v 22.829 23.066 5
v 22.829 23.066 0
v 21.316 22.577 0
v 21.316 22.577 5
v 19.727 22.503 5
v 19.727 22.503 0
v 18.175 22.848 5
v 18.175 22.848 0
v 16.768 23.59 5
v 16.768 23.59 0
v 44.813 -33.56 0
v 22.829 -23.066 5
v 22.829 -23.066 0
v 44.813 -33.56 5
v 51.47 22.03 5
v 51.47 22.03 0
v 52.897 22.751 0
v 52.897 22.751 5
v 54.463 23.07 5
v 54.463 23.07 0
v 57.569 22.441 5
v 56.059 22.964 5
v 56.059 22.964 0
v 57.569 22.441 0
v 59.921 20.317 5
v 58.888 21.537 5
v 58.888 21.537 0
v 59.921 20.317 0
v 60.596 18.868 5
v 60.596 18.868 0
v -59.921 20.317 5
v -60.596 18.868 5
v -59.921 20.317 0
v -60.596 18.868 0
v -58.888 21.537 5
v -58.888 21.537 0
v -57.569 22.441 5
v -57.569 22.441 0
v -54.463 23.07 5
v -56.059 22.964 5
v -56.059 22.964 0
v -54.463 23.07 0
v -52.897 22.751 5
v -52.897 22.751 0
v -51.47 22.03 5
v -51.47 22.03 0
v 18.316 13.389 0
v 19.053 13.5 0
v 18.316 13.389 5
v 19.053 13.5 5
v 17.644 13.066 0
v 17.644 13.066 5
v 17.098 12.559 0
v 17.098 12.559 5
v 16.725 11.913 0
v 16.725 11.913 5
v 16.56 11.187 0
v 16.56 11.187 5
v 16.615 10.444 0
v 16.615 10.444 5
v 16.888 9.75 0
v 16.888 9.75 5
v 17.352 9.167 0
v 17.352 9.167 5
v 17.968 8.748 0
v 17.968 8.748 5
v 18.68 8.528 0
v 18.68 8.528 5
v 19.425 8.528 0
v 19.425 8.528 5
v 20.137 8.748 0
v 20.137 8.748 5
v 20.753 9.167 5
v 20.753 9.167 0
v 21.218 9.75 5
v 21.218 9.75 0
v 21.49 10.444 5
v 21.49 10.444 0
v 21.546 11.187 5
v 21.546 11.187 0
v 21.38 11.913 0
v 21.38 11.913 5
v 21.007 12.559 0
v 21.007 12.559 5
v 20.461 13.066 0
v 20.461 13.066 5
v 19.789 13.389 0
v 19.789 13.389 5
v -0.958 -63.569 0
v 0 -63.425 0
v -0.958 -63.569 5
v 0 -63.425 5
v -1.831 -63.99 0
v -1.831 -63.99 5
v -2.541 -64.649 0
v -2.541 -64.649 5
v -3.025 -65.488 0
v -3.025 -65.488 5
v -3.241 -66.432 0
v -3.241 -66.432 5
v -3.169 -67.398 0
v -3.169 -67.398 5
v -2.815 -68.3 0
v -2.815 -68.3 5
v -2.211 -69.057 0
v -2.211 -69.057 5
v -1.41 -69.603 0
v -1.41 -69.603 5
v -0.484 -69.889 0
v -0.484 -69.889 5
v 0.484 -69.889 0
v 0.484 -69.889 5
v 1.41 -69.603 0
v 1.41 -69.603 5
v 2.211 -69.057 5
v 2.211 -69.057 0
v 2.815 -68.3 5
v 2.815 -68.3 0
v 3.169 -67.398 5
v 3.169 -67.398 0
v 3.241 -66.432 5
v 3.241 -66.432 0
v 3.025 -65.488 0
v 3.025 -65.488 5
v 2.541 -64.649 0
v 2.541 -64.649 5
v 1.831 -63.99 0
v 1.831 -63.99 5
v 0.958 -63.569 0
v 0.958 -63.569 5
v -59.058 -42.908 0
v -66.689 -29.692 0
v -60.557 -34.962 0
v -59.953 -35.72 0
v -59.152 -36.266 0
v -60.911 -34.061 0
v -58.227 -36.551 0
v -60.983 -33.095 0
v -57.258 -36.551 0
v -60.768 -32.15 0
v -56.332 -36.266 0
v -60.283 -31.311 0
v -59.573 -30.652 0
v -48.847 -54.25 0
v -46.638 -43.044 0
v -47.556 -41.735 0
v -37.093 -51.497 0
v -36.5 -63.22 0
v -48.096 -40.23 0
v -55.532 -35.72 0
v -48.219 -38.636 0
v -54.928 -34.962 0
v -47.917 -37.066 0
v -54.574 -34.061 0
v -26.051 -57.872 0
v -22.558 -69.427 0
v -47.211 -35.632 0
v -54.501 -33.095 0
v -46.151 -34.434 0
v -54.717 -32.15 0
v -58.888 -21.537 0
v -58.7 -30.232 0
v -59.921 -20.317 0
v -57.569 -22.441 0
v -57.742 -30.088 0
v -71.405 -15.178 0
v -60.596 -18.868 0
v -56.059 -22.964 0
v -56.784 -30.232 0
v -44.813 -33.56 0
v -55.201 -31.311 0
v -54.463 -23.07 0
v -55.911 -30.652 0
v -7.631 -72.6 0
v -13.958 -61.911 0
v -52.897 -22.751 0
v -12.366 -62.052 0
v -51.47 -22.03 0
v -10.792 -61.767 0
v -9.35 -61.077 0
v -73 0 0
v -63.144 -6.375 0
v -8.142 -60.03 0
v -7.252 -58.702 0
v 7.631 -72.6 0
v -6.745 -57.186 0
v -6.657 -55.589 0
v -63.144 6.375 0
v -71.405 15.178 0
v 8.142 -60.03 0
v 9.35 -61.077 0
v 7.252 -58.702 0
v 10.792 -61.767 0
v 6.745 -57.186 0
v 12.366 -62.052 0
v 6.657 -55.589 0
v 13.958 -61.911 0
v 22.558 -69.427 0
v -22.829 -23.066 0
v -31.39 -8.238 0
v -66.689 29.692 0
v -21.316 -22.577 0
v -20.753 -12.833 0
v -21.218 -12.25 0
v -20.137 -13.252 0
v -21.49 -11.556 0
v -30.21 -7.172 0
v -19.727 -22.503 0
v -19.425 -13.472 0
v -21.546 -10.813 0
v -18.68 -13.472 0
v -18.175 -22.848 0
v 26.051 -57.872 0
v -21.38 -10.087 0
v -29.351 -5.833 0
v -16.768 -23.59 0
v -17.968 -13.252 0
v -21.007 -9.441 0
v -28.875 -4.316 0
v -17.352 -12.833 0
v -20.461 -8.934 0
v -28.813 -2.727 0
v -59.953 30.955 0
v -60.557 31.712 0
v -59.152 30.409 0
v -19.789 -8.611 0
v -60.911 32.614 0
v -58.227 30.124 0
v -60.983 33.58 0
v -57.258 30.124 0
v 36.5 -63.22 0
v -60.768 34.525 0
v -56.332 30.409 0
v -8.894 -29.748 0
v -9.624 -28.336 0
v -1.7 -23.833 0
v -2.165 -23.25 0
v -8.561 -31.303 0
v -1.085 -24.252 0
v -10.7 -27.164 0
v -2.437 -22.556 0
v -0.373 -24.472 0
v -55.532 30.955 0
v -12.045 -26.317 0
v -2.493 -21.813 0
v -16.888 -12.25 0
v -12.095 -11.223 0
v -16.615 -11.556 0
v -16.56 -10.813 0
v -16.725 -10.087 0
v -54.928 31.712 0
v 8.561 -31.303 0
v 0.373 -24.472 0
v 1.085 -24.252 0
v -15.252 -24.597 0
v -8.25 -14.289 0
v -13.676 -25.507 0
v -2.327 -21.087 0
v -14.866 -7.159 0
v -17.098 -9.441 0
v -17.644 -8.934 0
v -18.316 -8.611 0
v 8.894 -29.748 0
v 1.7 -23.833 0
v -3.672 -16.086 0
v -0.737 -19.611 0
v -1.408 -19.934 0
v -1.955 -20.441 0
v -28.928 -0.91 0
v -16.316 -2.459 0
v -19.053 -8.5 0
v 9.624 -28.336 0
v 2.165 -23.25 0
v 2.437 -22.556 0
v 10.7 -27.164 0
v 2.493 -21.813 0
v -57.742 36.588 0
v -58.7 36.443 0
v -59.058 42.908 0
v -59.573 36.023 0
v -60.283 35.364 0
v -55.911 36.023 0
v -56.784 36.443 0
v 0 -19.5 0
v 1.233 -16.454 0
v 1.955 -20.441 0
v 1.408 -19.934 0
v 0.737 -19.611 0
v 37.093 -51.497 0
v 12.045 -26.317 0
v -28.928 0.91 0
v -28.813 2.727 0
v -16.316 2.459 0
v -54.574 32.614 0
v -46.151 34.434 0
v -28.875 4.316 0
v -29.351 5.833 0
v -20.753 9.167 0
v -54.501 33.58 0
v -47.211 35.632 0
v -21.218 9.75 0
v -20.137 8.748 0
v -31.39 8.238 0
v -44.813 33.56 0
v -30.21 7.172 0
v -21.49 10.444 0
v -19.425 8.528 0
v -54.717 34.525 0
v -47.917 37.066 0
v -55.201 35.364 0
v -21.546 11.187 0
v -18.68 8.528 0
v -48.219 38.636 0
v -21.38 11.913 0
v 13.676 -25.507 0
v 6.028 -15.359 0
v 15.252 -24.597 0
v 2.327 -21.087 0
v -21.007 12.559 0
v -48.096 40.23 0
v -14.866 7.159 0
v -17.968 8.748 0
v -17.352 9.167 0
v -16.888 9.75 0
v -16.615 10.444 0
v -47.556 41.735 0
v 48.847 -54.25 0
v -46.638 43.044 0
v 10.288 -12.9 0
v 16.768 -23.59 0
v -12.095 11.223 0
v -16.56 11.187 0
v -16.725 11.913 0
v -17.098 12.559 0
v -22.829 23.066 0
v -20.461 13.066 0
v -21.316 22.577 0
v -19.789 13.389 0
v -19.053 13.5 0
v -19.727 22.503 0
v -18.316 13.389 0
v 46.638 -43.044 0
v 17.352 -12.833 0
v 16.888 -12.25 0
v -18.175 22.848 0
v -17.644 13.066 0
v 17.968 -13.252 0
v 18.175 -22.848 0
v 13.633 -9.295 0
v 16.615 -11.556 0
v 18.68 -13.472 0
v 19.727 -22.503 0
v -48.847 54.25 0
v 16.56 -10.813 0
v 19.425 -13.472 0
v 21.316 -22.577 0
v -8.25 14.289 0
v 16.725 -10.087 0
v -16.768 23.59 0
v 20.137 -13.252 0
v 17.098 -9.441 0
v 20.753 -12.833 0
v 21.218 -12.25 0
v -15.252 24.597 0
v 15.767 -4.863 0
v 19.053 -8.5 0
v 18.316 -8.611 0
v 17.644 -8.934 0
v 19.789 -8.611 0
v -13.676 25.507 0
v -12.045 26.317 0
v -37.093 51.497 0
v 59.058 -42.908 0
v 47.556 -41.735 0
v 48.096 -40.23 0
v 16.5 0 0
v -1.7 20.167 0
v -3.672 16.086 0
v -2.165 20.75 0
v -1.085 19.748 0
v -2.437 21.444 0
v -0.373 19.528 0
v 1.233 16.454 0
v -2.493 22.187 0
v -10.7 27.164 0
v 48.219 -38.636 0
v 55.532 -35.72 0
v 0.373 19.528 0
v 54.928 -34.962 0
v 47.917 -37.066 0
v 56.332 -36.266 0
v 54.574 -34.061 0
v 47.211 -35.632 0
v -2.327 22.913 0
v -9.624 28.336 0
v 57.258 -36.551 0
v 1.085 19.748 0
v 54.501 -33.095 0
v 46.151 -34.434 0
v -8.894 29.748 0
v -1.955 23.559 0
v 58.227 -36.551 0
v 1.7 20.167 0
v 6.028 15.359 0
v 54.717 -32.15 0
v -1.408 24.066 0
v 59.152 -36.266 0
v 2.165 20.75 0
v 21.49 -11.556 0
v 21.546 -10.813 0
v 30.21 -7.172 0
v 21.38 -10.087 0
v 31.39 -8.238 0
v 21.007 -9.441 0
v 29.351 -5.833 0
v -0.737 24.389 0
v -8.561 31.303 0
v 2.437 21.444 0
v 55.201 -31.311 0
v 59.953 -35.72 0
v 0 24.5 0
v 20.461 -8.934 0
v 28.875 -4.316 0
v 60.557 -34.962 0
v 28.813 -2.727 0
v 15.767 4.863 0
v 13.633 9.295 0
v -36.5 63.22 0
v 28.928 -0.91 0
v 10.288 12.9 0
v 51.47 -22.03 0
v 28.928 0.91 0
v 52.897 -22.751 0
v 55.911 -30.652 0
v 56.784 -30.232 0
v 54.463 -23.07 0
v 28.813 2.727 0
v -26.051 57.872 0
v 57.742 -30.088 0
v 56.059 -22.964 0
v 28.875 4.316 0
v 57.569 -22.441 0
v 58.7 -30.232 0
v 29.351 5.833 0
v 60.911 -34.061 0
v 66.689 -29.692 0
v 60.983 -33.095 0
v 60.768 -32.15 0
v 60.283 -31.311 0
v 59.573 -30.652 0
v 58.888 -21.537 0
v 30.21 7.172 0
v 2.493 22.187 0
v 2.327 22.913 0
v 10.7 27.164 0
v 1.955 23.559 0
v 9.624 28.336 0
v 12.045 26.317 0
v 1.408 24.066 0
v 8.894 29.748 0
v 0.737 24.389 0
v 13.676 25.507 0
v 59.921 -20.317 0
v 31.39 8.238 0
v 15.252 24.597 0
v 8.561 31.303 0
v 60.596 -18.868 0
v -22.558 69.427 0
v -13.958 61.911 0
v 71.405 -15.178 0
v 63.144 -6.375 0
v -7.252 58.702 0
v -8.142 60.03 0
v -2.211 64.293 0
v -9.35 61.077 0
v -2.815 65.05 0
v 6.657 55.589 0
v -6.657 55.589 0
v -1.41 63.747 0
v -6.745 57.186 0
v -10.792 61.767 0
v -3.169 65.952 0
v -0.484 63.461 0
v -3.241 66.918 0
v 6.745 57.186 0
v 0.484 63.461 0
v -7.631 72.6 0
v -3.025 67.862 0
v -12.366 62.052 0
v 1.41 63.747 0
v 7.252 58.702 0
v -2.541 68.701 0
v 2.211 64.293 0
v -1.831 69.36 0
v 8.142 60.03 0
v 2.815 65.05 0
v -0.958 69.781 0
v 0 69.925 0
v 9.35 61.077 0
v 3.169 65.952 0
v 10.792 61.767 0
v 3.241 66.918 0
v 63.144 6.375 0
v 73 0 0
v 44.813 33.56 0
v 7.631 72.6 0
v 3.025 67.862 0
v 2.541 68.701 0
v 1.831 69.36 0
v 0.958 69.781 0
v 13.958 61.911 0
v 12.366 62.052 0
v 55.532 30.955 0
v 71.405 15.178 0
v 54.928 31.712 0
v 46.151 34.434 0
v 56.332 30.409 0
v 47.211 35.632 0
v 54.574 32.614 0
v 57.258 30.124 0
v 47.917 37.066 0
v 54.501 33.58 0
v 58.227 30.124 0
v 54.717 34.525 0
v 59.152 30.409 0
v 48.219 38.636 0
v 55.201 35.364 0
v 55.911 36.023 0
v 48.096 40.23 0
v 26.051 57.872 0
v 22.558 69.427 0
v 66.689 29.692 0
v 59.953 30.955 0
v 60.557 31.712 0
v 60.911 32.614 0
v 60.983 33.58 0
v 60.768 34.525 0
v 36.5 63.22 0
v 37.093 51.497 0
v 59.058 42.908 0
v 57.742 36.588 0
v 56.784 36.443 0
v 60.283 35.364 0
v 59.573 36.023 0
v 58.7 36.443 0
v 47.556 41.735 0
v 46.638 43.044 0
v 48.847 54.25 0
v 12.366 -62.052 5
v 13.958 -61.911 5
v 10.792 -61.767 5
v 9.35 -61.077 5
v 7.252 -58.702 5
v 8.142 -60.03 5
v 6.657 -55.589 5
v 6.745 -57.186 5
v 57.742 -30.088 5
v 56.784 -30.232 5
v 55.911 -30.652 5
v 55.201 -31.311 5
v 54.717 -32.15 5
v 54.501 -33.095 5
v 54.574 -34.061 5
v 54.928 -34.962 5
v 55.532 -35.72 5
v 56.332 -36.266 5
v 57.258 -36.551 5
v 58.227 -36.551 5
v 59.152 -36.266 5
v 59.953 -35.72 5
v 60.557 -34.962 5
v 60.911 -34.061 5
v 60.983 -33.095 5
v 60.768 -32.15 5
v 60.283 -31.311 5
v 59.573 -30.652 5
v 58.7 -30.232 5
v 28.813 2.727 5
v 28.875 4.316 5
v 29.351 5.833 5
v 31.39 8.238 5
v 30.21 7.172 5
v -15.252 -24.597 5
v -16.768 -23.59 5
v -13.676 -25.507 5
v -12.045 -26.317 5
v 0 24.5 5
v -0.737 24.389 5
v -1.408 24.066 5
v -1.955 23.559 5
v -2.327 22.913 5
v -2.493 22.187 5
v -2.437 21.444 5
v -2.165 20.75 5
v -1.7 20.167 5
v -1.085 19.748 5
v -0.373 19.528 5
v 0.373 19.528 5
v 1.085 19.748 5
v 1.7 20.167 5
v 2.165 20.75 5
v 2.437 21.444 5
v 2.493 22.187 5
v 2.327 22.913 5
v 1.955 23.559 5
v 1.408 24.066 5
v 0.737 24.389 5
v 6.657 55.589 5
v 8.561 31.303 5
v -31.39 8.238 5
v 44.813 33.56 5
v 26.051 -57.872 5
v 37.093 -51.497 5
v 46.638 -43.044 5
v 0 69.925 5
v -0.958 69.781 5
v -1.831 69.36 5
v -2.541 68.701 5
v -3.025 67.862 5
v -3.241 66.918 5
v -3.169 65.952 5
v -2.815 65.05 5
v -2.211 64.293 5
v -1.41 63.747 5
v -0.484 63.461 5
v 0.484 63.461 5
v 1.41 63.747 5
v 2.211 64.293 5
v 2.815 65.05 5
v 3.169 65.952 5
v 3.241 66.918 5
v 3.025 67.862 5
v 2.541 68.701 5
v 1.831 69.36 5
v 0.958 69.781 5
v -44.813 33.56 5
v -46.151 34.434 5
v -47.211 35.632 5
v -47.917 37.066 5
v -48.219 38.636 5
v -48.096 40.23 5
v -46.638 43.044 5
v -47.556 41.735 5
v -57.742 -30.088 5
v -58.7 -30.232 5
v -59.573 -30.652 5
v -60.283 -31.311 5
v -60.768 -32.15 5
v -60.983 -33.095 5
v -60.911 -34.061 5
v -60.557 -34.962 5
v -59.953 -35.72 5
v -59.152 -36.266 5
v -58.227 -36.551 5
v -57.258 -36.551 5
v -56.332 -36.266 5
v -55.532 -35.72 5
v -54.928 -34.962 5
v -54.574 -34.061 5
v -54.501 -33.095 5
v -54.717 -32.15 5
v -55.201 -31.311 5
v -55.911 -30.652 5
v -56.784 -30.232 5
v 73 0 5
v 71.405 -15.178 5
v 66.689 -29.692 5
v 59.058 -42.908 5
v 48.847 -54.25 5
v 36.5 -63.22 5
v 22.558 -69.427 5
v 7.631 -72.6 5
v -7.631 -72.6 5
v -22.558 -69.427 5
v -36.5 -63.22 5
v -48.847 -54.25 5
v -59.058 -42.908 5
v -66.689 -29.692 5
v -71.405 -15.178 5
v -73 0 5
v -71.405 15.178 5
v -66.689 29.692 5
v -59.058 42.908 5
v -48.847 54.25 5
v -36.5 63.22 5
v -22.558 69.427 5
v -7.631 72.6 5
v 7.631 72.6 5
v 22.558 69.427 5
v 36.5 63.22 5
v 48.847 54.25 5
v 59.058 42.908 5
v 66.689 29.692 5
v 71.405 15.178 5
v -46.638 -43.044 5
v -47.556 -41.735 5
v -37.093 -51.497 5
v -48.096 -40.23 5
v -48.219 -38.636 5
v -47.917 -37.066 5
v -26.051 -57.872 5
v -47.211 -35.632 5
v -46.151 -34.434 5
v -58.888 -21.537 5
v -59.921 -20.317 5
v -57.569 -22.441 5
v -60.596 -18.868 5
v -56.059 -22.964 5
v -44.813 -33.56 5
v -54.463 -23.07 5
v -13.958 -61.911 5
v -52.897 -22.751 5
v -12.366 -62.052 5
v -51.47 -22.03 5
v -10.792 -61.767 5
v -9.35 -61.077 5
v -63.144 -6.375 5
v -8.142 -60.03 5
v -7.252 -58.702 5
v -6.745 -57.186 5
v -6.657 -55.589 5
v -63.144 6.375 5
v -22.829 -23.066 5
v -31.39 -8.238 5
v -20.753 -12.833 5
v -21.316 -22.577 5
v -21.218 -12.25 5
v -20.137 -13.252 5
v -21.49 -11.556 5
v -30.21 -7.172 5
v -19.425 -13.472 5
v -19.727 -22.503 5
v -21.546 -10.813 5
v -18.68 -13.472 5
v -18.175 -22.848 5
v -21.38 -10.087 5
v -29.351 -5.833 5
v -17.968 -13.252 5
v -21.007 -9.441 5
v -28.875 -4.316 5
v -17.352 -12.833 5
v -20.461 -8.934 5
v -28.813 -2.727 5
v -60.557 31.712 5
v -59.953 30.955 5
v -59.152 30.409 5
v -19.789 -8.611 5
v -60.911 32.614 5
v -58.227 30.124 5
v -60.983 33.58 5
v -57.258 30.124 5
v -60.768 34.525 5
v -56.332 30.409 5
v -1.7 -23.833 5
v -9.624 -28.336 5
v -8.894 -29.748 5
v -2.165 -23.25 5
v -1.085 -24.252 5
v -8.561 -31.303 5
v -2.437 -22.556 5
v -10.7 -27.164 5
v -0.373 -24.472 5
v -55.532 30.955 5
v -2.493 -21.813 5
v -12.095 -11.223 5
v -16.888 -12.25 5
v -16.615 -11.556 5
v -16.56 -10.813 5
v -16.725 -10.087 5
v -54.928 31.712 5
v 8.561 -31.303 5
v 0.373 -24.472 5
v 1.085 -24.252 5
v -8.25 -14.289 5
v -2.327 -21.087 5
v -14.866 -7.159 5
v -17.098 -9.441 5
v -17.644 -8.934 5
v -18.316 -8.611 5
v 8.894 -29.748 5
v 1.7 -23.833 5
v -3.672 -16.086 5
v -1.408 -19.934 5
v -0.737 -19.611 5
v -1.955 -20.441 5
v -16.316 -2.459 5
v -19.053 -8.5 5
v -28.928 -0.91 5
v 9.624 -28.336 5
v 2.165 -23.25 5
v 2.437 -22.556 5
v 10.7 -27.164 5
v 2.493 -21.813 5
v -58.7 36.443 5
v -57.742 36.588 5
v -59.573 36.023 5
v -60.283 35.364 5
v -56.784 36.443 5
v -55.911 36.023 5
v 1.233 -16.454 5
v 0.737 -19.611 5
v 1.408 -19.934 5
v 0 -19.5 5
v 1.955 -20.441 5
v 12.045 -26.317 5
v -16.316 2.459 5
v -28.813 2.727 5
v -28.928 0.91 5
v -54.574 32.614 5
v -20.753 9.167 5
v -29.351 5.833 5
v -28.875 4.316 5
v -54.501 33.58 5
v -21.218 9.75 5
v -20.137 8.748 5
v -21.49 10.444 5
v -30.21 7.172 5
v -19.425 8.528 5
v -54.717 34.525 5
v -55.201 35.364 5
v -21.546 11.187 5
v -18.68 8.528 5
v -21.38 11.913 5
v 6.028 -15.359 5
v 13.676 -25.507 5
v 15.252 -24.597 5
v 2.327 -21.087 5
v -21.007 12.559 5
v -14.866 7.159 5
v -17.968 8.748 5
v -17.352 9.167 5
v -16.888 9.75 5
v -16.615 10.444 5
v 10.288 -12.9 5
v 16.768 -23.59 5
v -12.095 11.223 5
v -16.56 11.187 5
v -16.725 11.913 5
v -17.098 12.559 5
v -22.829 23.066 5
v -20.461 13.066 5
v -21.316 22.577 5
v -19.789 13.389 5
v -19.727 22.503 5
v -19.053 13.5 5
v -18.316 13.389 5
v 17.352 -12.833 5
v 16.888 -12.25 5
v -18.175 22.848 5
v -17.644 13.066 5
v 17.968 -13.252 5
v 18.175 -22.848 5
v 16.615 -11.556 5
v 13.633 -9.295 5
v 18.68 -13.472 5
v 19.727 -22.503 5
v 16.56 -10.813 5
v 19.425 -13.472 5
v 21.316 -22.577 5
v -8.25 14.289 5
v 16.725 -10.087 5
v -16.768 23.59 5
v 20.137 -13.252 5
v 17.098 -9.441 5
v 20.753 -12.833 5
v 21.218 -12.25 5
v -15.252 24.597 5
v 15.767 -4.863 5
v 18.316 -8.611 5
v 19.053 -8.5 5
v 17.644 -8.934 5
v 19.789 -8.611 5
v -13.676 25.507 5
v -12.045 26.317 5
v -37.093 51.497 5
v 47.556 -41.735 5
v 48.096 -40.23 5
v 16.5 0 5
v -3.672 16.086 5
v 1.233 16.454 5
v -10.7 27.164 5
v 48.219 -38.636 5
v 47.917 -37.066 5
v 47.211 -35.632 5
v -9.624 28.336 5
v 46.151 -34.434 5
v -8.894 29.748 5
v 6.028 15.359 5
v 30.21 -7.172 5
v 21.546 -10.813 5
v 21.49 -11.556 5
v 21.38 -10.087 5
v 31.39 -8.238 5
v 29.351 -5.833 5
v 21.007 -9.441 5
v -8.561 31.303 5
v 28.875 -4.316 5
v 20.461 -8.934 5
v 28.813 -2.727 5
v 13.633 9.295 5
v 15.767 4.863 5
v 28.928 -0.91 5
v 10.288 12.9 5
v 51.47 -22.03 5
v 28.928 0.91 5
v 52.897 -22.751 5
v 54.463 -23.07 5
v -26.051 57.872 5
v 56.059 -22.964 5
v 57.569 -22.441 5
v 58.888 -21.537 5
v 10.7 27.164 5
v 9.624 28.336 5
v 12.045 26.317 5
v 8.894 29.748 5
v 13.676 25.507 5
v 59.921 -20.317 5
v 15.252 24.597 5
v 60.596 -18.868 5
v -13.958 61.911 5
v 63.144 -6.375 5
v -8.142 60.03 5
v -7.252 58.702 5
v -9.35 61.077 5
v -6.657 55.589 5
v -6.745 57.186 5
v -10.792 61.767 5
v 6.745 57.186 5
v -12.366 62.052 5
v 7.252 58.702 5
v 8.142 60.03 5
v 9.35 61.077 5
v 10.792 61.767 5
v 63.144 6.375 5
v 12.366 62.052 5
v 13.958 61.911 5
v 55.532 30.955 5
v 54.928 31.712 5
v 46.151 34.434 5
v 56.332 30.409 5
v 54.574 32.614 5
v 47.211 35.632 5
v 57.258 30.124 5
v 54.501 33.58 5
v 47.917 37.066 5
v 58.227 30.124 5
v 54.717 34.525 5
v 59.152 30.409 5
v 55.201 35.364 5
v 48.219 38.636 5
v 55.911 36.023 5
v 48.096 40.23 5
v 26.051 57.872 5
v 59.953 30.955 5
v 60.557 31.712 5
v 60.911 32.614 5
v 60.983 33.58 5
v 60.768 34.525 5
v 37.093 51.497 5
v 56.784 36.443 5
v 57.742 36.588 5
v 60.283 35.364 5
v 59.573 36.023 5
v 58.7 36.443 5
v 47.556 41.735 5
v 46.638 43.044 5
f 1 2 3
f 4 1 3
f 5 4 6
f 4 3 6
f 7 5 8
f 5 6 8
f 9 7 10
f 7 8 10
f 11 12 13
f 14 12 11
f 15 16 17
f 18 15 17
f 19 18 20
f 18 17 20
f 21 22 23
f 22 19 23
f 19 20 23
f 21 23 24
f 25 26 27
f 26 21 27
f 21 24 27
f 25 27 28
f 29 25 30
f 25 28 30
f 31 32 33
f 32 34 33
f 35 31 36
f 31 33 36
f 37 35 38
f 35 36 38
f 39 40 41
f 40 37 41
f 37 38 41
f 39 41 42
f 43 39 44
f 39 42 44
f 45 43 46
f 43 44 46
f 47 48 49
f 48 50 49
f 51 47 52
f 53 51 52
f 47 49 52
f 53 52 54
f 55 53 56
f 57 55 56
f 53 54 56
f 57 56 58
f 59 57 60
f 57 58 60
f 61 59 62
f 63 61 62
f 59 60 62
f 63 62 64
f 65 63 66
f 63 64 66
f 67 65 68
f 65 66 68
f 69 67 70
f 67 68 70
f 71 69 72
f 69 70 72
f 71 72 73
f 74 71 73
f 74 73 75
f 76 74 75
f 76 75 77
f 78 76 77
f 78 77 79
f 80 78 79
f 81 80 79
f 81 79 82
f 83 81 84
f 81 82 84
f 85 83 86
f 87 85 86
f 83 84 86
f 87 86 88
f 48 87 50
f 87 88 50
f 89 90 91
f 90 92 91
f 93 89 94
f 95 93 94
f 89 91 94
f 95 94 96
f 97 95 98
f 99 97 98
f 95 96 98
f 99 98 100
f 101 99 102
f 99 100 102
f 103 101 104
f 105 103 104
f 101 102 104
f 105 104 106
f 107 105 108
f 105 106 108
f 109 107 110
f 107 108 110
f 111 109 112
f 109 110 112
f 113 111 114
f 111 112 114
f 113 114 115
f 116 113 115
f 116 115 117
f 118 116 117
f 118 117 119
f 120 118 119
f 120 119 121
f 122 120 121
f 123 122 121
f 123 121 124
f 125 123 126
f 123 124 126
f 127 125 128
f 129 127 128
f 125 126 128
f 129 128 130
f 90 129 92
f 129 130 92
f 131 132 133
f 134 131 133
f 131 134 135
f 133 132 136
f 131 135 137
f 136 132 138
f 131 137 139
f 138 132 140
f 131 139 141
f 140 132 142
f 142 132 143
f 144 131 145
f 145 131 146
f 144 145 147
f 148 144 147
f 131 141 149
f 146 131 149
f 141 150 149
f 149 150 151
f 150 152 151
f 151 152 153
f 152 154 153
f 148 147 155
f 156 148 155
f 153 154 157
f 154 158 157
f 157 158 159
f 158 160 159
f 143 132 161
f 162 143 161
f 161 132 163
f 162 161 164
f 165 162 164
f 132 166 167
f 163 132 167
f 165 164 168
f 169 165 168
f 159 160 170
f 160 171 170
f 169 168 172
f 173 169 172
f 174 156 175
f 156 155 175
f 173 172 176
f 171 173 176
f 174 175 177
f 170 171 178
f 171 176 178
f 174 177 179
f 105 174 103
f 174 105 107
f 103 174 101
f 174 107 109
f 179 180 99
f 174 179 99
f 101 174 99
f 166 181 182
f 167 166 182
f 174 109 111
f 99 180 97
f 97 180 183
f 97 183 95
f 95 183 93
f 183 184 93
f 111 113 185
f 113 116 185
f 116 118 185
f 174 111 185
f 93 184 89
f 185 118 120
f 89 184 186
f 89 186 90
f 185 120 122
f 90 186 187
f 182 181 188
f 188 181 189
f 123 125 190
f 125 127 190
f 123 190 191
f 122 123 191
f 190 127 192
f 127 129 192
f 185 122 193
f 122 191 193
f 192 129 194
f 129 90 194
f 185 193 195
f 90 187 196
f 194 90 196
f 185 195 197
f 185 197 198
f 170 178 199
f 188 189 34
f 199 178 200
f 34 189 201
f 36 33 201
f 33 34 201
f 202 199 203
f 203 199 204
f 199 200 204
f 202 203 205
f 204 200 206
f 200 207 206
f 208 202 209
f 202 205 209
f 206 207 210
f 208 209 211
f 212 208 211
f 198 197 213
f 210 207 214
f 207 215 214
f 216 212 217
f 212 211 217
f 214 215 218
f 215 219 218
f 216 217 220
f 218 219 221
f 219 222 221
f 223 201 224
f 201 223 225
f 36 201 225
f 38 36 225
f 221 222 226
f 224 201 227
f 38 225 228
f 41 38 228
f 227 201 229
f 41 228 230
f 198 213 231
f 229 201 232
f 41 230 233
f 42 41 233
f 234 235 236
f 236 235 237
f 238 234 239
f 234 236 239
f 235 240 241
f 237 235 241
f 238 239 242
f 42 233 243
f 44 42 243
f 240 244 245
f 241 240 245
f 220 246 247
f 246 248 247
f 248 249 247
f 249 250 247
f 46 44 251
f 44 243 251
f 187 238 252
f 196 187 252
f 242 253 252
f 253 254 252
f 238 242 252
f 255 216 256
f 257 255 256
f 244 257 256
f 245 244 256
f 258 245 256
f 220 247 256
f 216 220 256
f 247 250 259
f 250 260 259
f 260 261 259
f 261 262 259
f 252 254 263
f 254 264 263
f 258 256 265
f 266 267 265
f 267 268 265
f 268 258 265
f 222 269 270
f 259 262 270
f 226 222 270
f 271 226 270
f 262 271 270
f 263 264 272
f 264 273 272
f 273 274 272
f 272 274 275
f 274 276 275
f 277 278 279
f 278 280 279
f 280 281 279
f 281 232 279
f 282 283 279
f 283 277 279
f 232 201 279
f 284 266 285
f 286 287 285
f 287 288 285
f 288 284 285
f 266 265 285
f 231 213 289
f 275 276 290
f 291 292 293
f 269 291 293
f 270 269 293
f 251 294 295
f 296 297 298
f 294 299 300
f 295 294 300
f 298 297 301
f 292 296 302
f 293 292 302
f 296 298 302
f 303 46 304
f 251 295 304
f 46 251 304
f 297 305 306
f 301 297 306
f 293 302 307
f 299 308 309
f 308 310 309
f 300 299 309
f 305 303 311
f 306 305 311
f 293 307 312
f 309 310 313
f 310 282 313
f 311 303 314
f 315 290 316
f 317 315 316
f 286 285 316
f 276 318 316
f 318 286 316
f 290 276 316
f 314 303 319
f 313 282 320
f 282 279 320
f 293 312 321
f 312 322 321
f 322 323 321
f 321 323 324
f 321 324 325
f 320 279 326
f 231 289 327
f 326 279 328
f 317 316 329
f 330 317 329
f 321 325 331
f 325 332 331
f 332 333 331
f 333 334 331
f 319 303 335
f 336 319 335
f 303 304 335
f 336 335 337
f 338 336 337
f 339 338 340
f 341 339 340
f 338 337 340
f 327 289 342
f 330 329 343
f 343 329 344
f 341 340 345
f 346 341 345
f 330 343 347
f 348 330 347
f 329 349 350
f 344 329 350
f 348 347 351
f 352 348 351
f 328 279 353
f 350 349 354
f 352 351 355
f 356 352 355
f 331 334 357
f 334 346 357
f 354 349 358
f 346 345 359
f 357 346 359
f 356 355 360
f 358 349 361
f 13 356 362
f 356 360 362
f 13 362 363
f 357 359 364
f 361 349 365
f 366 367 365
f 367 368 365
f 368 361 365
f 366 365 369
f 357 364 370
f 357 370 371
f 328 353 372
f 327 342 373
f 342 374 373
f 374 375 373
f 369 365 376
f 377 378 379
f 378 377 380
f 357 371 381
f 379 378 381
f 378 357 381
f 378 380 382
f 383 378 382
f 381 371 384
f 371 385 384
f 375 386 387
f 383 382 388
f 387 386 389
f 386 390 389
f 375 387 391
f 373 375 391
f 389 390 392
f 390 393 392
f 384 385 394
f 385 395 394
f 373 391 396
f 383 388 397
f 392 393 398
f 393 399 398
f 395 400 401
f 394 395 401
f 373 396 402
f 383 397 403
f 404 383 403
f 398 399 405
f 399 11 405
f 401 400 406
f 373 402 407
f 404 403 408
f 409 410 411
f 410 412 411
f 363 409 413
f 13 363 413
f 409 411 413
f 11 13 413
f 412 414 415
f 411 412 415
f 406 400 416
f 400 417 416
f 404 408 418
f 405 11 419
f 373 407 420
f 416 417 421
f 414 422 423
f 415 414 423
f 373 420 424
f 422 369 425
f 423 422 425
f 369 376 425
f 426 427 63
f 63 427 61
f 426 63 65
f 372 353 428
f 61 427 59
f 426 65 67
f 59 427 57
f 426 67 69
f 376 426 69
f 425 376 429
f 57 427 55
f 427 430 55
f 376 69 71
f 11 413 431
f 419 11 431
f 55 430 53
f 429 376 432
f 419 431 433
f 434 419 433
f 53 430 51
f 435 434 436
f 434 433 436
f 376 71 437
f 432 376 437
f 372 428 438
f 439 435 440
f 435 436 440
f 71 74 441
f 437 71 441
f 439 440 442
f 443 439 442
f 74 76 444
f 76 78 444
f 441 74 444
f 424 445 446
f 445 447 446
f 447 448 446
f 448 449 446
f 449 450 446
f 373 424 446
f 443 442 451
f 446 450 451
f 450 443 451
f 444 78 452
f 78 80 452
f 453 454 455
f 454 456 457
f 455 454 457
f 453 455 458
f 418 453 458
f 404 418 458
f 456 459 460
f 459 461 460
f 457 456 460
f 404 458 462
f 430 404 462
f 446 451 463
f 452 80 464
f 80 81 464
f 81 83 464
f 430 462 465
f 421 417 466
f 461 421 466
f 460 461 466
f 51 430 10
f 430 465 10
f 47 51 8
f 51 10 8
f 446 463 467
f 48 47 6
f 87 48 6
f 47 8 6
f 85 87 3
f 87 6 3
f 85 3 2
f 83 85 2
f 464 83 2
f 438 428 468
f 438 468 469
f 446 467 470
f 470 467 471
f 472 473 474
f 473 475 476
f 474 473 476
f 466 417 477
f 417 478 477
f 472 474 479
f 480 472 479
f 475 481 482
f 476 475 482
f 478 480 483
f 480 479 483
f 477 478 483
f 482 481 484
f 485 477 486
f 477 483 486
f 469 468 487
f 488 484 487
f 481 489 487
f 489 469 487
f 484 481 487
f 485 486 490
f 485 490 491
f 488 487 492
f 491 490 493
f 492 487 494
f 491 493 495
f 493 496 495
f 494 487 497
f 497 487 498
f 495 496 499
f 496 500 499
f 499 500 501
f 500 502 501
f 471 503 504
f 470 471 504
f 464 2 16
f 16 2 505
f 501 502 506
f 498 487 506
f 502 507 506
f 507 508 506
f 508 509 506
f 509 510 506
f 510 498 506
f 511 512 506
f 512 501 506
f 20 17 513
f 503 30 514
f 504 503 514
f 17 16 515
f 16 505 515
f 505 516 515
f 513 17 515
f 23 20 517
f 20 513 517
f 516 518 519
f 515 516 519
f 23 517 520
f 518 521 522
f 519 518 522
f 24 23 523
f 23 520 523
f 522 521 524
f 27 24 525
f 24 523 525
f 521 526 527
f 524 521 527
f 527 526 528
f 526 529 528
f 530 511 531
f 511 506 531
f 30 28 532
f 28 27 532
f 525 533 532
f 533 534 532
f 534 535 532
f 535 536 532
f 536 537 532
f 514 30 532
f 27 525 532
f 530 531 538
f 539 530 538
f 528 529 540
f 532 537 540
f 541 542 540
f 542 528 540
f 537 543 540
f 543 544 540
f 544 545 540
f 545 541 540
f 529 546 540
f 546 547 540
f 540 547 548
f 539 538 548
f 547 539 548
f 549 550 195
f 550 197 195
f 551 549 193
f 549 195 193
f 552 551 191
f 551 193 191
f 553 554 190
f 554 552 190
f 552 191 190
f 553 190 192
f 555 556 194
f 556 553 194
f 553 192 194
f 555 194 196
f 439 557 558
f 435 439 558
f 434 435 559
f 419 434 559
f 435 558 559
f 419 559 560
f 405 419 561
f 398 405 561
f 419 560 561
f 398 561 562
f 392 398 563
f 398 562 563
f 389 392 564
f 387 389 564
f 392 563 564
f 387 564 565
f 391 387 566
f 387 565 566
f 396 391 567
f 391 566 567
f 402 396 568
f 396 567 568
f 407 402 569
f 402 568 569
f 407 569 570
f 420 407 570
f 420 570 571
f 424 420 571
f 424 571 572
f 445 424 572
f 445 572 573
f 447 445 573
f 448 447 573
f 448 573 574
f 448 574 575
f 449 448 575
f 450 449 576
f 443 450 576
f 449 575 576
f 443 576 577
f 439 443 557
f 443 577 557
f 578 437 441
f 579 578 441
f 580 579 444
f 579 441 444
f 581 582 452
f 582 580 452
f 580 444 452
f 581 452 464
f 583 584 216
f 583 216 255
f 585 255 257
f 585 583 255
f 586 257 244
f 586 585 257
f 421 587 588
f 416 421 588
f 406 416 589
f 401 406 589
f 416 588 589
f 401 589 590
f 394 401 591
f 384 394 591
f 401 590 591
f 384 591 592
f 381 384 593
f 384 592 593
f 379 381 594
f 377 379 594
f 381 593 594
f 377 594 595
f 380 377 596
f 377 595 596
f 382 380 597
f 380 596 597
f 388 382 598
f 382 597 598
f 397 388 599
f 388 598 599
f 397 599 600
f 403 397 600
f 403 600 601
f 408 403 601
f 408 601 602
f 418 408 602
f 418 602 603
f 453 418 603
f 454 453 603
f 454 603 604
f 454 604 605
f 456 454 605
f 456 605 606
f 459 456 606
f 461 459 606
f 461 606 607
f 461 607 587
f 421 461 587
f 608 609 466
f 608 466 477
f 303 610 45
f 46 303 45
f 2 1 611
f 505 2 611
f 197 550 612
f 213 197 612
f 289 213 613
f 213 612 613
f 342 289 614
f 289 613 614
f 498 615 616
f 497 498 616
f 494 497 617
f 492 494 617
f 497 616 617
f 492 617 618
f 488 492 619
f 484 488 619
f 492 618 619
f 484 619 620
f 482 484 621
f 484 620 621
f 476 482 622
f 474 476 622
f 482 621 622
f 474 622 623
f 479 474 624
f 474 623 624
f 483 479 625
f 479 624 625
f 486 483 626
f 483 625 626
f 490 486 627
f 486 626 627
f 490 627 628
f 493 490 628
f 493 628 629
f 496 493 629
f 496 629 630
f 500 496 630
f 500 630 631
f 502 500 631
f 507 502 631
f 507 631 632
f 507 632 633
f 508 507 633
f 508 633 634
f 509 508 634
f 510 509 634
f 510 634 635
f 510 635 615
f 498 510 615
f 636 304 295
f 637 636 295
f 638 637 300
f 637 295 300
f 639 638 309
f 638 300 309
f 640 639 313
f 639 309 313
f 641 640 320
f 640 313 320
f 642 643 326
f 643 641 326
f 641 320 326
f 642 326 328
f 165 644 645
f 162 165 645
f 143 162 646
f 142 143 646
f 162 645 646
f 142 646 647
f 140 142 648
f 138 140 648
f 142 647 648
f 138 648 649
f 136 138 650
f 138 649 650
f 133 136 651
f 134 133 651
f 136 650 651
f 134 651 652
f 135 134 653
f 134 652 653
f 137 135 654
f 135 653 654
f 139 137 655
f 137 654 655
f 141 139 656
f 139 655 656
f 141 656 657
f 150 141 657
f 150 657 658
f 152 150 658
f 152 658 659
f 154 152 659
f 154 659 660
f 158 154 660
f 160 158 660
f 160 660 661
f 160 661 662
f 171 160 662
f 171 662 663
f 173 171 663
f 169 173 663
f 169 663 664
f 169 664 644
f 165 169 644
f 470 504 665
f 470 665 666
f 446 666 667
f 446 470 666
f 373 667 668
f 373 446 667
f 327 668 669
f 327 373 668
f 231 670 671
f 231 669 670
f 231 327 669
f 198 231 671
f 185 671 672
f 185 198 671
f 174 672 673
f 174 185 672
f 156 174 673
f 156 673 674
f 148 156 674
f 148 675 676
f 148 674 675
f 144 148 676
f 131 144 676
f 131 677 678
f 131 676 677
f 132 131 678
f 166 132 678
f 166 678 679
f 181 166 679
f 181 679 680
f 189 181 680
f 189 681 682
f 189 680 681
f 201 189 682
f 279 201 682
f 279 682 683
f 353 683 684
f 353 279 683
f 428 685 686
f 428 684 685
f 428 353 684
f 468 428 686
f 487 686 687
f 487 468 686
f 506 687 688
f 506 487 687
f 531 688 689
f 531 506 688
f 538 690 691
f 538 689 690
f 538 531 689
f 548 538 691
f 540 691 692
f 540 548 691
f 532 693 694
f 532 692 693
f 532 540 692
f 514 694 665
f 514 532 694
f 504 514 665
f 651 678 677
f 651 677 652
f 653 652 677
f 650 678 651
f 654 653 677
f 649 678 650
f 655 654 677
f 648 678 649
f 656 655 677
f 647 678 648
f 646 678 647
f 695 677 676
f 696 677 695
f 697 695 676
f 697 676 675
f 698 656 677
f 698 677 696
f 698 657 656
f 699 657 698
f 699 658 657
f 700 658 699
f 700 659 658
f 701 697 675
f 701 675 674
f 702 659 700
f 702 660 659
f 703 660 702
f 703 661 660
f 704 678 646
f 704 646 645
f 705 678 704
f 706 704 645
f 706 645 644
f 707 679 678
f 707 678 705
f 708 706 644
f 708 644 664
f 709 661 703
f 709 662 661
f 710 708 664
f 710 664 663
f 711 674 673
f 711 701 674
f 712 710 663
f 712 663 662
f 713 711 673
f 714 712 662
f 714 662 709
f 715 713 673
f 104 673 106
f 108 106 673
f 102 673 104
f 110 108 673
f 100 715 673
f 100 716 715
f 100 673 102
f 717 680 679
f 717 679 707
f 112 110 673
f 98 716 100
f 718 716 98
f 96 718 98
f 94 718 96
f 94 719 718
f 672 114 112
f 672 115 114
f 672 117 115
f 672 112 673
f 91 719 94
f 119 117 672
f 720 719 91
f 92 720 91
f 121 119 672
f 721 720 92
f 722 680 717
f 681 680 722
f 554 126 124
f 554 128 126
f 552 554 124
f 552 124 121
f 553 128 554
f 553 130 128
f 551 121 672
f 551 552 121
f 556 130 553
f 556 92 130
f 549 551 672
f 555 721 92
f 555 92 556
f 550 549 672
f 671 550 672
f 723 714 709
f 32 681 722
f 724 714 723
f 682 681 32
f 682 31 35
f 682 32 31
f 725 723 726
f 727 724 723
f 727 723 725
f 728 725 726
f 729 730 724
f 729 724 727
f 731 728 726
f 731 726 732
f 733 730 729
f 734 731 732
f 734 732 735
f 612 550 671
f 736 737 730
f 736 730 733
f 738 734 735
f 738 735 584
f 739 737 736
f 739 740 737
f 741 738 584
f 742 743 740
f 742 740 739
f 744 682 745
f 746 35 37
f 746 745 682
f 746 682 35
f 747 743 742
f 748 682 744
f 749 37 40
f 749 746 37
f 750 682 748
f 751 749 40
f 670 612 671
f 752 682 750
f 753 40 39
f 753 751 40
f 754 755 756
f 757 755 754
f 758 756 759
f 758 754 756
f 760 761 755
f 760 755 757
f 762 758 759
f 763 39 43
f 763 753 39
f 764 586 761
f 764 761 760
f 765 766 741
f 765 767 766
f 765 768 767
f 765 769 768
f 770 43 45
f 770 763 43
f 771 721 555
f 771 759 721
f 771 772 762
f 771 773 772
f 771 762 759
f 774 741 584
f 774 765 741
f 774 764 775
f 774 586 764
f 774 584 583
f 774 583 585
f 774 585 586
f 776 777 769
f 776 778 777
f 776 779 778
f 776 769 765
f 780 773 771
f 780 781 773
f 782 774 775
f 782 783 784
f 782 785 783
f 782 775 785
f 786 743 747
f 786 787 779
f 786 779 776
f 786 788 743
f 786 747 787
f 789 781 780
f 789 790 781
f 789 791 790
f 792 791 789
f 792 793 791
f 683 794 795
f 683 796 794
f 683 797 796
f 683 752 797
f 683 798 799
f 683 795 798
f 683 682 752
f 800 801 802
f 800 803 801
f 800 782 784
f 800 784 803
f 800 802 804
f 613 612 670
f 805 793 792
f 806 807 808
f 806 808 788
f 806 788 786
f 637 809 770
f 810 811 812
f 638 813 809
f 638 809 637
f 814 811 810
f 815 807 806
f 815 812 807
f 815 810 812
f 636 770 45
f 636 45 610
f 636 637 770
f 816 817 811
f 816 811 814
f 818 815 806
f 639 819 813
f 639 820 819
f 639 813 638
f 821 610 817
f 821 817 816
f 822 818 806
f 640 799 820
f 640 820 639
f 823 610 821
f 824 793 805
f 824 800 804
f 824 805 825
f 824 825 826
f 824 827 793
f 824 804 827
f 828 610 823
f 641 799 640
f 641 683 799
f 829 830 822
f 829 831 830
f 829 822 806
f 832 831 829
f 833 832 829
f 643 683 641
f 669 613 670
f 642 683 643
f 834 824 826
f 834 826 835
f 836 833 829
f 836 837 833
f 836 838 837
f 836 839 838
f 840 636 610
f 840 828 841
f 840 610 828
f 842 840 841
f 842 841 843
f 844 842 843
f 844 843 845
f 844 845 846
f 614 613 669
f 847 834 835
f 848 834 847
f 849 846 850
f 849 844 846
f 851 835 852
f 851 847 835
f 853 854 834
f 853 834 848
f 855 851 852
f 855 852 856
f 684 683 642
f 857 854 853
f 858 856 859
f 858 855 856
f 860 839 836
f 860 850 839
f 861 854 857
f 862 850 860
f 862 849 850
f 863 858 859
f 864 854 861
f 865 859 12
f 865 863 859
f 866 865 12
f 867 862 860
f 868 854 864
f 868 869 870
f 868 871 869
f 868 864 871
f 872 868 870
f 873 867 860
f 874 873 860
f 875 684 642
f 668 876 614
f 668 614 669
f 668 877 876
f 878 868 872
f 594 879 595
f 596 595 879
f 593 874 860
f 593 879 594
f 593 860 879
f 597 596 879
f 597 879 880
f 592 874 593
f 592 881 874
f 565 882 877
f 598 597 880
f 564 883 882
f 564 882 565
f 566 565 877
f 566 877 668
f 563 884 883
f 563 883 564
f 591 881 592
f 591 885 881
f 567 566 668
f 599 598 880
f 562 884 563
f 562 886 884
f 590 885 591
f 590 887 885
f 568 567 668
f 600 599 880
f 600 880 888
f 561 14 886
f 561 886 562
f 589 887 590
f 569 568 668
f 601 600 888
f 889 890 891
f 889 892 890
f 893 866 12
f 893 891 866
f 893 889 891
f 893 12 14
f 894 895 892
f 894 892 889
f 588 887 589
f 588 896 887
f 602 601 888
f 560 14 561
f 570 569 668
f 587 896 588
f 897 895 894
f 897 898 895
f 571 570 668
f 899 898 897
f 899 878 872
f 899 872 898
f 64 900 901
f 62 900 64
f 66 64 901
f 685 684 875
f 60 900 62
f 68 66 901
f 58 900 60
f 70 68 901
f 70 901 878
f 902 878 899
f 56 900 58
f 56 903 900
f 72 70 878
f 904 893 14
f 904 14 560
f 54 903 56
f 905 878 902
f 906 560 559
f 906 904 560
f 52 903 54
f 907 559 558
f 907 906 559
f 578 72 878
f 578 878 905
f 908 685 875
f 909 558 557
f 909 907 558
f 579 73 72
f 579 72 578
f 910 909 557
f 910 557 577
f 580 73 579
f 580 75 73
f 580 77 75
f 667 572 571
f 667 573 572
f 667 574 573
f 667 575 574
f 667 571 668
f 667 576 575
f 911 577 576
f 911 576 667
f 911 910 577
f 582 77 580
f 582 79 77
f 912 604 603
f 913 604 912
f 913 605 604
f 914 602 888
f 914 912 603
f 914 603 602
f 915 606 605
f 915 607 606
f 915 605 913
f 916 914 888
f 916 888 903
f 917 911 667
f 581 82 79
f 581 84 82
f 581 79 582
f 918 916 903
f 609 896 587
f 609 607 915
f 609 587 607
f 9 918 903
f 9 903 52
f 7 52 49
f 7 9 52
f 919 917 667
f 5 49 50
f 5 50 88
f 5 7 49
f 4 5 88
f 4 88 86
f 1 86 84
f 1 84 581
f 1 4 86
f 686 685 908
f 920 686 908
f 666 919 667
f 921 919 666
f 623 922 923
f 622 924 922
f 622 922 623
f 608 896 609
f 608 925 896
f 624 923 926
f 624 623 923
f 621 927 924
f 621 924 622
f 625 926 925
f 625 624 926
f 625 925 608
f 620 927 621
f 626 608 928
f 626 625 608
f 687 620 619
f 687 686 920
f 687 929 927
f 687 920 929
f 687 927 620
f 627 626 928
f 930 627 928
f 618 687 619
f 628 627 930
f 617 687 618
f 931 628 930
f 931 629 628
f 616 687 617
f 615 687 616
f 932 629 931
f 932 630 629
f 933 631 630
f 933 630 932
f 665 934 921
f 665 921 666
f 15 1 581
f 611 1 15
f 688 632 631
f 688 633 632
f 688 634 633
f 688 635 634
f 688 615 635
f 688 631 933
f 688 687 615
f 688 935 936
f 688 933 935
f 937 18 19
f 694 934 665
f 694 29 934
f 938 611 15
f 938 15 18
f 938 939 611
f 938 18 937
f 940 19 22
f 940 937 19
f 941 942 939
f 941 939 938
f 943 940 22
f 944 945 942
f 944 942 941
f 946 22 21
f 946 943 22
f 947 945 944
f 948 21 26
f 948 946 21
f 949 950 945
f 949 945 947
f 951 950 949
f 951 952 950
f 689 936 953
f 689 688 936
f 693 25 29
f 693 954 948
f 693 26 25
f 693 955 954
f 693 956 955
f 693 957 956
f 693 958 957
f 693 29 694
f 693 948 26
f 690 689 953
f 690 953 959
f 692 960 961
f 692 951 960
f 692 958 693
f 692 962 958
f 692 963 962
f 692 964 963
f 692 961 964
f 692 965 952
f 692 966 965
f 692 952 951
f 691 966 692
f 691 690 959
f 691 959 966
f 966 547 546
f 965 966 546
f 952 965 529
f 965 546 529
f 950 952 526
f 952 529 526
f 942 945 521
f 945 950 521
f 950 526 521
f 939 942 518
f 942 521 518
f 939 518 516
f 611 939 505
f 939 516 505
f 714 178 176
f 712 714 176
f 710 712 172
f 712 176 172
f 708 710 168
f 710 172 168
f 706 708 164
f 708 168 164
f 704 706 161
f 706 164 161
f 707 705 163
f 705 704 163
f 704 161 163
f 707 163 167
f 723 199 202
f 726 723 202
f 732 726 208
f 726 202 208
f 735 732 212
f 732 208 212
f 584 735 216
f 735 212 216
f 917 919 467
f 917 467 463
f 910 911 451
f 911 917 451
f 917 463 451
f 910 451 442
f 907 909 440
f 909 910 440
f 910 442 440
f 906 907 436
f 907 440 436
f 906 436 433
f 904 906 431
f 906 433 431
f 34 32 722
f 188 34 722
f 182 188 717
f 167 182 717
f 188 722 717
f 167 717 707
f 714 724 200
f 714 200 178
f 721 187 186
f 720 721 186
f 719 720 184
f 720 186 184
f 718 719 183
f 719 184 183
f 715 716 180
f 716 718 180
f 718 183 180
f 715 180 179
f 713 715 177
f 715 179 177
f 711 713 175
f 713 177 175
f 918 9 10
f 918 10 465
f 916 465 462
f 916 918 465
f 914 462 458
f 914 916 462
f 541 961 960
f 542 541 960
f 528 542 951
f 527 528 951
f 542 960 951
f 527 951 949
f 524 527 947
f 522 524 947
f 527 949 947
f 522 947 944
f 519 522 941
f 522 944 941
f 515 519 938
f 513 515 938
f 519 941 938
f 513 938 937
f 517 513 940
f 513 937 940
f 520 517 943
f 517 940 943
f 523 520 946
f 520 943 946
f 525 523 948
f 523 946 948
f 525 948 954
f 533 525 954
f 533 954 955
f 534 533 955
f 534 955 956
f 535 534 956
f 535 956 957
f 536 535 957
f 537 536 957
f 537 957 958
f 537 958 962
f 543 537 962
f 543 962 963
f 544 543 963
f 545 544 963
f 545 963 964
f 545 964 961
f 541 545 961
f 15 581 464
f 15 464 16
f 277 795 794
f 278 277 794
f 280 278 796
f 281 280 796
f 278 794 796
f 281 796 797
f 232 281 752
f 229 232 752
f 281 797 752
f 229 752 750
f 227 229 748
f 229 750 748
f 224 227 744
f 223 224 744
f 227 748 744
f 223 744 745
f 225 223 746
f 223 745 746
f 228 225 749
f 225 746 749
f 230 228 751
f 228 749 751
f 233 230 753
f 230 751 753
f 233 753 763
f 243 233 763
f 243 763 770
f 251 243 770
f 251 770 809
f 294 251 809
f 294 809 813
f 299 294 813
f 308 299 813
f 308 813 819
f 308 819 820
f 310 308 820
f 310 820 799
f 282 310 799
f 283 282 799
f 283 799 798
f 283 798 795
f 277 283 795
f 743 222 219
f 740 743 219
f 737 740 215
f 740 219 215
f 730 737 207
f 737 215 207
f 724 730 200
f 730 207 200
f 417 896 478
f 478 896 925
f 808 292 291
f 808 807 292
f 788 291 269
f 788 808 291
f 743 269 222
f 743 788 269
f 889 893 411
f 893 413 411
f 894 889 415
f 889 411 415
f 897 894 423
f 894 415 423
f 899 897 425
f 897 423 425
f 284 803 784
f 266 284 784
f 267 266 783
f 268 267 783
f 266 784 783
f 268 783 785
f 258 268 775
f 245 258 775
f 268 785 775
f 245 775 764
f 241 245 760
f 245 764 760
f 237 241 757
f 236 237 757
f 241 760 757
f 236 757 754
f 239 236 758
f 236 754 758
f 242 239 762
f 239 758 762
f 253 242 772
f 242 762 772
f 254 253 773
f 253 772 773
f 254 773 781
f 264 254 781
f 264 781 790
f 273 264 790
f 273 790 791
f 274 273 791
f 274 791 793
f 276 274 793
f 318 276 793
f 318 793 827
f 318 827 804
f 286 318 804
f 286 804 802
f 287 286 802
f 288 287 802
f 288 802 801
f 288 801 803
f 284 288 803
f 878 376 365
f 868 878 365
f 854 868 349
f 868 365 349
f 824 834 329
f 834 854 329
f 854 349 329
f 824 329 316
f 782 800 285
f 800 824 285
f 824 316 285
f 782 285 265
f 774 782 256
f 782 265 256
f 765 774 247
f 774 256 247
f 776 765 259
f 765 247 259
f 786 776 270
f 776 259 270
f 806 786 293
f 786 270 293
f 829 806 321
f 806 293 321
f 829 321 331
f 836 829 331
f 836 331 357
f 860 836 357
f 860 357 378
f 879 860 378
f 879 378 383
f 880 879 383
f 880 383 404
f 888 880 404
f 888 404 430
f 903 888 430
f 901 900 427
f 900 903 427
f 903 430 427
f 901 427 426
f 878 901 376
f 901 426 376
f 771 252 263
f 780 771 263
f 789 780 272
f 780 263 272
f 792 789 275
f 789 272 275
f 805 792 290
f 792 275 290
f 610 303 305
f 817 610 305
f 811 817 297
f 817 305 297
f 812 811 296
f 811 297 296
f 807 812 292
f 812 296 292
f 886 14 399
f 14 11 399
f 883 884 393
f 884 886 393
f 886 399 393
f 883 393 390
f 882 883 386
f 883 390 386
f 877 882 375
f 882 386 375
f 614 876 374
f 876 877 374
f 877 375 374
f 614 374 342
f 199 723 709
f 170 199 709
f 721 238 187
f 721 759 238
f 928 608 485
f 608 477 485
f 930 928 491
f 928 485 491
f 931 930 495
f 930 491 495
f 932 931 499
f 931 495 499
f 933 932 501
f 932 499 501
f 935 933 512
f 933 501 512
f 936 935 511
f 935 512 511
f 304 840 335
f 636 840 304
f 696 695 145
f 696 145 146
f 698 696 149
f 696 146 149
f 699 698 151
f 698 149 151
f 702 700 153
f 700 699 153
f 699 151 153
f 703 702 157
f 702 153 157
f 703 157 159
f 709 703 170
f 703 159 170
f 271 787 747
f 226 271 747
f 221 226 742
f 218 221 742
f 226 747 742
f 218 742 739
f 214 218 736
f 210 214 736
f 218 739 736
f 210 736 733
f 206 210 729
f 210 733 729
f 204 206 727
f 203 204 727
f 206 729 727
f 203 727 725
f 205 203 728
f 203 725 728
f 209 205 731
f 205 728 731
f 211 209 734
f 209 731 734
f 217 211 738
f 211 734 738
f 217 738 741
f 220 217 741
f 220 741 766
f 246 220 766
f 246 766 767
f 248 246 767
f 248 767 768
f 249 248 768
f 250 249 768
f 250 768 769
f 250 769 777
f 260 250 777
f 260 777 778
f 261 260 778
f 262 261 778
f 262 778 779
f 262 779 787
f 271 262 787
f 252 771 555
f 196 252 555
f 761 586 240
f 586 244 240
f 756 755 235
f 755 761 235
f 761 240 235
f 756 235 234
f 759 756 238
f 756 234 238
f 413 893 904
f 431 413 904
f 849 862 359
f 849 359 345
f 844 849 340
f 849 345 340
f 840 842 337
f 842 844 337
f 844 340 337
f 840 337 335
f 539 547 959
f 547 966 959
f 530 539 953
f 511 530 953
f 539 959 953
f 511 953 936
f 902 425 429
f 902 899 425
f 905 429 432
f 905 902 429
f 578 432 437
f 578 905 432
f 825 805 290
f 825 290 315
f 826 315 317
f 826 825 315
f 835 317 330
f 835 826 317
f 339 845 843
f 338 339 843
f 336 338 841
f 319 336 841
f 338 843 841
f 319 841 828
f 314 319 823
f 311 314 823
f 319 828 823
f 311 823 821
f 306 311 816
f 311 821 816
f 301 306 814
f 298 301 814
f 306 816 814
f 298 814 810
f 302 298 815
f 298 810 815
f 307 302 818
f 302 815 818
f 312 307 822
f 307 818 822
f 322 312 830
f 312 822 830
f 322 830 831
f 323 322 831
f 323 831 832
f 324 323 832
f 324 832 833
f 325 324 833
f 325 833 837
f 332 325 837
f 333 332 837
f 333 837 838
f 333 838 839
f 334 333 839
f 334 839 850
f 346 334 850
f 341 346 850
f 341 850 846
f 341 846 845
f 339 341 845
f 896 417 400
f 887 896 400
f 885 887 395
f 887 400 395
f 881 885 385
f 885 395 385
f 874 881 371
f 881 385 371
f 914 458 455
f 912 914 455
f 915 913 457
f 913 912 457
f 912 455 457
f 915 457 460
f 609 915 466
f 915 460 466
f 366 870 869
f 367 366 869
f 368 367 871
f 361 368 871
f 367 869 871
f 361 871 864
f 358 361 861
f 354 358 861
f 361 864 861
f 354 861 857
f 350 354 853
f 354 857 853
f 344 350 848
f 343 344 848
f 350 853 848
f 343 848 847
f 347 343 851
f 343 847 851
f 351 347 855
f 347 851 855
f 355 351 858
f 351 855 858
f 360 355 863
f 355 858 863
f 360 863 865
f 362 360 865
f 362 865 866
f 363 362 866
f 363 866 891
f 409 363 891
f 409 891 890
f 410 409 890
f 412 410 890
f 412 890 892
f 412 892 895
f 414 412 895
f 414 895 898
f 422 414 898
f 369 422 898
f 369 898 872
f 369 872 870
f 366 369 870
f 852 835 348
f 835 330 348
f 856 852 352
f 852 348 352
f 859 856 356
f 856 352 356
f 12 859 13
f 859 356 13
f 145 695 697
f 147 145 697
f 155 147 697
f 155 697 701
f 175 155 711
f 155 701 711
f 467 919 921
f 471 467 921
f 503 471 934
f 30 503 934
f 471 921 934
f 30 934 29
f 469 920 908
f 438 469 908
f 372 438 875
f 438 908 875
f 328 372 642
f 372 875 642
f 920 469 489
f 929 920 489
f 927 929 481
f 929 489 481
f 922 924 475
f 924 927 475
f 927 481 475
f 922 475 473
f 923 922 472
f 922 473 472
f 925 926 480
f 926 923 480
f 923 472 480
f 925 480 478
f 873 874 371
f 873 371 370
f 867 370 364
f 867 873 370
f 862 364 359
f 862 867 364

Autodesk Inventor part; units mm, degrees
ref_plane "YZ Plane" through (0, 0, 0) normal (1, 0, 0) x (0, 1, 0)
ref_plane "XZ Plane" through (0, 0, 0) normal (0, 1, 0) x (-1, 0, 0)
ref_plane "XY Plane" through (0, 0, 0) normal (0, 0, 1) x (1, 0, 0)
sketch "Sketch1" plane through (0, 0, 0) normal (0, 0, 1) x (1, 0, 0)
  circle A0 centre (0, 0) radius 16.5
  circle A1 centre (0, 0) radius 73
  point P0 (0, 66.675)
  point P1 (-57.7422, 33.3375)
  point P2 (-57.7422, -33.3375)
  point P3 (0, -66.675)
  point P4 (57.7422, -33.3375)
  point P5 (57.7422, 33.3375)
  point P6 (0, 22)
  point P7 (-19.0526, 11)
  point P8 (-19.0526, -11)
  point P9 (0, -22)
  point P10 (19.0526, -11)
  point P11 (19.0526, 11)
  dimension "d0" = 66.675
  dimension "d3" = 360
  dimension "d9" = 33
  dimension "d20" = 22
  dimension "d23" = 360
  dimension "d25" = 146
extrude "Extrusion2" add sketch "Sketch1" along normal blind 5
hole "Hole2" at (0, 66.675, 0) at (-57.7422, 33.3375, 0) at (-57.7422, -33.3375, 0) at (0, -66.675, 0) at (57.7422, -33.3375, 0) at (57.7422, 33.3375, 0) direction (0, 0, 1) diameter 6.5 end through all
hole "Hole3" at (0, 22, 0) at (-19.0526, 11, 0) at (-19.0526, -11, 0) at (0, -22, 0) at (19.0526, 11, 0) at (19.0526, -11, 0) direction (0, 0, 1) diameter 5 end through all
sketch "Sketch4" plane through (0, 0, 5) normal (0, 0, 1) x (1, 0, 0)
  circle A0 centre (0, 0) radius 28.9422 construction
  line L0 (0, 0) -> (58.5803, 0) construction
  circle A1 centre (-57.7422, 33.3375) radius 3.25 construction
  circle A2 centre (0, 66.675) radius 3.25 construction
  line L1 (-57.7422, 33.3375) -> (0, 66.675) construction
  circle A3 centre (0, 0) radius 16.5 construction
  circle A4 centre (-19.0526, 11) radius 2.5 construction
  circle A5 centre (0, 22) radius 2.5 construction
  line L2 (-19.0526, 11) -> (0, 22) construction
  circle A6 centre (0, 0) radius 63.4652 construction
  arc A7 (-6.0622, 63.175) -> (-51.6801, 36.8375) centre (0, 0) ccw
  line L3 (-9.5263, 16.5) -> (-21.2308, 36.7728) construction
  line L4 (-8.8547, 27.5544) -> (-19.4354, 21.4456) construction
  line L5 (-8.8547, 27.5544) -> (-6.0622, 63.175)
  line L6 (-19.4354, 21.4456) -> (-51.6801, 36.8375)
  arc A8 (-8.8547, 27.5544) -> (-19.4354, 21.4456) centre (0, 0) ccw
  point P0 (-14.1451, 24.5)
  dimension "d60" = 7
  dimension "d61" = 7
extrude "Extrusion4" cut sketch "Sketch4" against normal blind 10
fillet "Fillet1" radius 6 4 edges at (-51.6801, 36.8375, 2.5) (-6.0622, 63.175, 2.5) (-8.8547, 27.5544, 2.5) (-19.4354, 21.4456, 2.5)
pattern_circular "Circular Pattern1" count 6 over 360 about axis through (0, 0, -10) along (0, 0, 1) of "Extrusion4", "Fillet1"
equation "\"d61\" = d60"
properties part number "SprocketHubPlate_plasmacut"
